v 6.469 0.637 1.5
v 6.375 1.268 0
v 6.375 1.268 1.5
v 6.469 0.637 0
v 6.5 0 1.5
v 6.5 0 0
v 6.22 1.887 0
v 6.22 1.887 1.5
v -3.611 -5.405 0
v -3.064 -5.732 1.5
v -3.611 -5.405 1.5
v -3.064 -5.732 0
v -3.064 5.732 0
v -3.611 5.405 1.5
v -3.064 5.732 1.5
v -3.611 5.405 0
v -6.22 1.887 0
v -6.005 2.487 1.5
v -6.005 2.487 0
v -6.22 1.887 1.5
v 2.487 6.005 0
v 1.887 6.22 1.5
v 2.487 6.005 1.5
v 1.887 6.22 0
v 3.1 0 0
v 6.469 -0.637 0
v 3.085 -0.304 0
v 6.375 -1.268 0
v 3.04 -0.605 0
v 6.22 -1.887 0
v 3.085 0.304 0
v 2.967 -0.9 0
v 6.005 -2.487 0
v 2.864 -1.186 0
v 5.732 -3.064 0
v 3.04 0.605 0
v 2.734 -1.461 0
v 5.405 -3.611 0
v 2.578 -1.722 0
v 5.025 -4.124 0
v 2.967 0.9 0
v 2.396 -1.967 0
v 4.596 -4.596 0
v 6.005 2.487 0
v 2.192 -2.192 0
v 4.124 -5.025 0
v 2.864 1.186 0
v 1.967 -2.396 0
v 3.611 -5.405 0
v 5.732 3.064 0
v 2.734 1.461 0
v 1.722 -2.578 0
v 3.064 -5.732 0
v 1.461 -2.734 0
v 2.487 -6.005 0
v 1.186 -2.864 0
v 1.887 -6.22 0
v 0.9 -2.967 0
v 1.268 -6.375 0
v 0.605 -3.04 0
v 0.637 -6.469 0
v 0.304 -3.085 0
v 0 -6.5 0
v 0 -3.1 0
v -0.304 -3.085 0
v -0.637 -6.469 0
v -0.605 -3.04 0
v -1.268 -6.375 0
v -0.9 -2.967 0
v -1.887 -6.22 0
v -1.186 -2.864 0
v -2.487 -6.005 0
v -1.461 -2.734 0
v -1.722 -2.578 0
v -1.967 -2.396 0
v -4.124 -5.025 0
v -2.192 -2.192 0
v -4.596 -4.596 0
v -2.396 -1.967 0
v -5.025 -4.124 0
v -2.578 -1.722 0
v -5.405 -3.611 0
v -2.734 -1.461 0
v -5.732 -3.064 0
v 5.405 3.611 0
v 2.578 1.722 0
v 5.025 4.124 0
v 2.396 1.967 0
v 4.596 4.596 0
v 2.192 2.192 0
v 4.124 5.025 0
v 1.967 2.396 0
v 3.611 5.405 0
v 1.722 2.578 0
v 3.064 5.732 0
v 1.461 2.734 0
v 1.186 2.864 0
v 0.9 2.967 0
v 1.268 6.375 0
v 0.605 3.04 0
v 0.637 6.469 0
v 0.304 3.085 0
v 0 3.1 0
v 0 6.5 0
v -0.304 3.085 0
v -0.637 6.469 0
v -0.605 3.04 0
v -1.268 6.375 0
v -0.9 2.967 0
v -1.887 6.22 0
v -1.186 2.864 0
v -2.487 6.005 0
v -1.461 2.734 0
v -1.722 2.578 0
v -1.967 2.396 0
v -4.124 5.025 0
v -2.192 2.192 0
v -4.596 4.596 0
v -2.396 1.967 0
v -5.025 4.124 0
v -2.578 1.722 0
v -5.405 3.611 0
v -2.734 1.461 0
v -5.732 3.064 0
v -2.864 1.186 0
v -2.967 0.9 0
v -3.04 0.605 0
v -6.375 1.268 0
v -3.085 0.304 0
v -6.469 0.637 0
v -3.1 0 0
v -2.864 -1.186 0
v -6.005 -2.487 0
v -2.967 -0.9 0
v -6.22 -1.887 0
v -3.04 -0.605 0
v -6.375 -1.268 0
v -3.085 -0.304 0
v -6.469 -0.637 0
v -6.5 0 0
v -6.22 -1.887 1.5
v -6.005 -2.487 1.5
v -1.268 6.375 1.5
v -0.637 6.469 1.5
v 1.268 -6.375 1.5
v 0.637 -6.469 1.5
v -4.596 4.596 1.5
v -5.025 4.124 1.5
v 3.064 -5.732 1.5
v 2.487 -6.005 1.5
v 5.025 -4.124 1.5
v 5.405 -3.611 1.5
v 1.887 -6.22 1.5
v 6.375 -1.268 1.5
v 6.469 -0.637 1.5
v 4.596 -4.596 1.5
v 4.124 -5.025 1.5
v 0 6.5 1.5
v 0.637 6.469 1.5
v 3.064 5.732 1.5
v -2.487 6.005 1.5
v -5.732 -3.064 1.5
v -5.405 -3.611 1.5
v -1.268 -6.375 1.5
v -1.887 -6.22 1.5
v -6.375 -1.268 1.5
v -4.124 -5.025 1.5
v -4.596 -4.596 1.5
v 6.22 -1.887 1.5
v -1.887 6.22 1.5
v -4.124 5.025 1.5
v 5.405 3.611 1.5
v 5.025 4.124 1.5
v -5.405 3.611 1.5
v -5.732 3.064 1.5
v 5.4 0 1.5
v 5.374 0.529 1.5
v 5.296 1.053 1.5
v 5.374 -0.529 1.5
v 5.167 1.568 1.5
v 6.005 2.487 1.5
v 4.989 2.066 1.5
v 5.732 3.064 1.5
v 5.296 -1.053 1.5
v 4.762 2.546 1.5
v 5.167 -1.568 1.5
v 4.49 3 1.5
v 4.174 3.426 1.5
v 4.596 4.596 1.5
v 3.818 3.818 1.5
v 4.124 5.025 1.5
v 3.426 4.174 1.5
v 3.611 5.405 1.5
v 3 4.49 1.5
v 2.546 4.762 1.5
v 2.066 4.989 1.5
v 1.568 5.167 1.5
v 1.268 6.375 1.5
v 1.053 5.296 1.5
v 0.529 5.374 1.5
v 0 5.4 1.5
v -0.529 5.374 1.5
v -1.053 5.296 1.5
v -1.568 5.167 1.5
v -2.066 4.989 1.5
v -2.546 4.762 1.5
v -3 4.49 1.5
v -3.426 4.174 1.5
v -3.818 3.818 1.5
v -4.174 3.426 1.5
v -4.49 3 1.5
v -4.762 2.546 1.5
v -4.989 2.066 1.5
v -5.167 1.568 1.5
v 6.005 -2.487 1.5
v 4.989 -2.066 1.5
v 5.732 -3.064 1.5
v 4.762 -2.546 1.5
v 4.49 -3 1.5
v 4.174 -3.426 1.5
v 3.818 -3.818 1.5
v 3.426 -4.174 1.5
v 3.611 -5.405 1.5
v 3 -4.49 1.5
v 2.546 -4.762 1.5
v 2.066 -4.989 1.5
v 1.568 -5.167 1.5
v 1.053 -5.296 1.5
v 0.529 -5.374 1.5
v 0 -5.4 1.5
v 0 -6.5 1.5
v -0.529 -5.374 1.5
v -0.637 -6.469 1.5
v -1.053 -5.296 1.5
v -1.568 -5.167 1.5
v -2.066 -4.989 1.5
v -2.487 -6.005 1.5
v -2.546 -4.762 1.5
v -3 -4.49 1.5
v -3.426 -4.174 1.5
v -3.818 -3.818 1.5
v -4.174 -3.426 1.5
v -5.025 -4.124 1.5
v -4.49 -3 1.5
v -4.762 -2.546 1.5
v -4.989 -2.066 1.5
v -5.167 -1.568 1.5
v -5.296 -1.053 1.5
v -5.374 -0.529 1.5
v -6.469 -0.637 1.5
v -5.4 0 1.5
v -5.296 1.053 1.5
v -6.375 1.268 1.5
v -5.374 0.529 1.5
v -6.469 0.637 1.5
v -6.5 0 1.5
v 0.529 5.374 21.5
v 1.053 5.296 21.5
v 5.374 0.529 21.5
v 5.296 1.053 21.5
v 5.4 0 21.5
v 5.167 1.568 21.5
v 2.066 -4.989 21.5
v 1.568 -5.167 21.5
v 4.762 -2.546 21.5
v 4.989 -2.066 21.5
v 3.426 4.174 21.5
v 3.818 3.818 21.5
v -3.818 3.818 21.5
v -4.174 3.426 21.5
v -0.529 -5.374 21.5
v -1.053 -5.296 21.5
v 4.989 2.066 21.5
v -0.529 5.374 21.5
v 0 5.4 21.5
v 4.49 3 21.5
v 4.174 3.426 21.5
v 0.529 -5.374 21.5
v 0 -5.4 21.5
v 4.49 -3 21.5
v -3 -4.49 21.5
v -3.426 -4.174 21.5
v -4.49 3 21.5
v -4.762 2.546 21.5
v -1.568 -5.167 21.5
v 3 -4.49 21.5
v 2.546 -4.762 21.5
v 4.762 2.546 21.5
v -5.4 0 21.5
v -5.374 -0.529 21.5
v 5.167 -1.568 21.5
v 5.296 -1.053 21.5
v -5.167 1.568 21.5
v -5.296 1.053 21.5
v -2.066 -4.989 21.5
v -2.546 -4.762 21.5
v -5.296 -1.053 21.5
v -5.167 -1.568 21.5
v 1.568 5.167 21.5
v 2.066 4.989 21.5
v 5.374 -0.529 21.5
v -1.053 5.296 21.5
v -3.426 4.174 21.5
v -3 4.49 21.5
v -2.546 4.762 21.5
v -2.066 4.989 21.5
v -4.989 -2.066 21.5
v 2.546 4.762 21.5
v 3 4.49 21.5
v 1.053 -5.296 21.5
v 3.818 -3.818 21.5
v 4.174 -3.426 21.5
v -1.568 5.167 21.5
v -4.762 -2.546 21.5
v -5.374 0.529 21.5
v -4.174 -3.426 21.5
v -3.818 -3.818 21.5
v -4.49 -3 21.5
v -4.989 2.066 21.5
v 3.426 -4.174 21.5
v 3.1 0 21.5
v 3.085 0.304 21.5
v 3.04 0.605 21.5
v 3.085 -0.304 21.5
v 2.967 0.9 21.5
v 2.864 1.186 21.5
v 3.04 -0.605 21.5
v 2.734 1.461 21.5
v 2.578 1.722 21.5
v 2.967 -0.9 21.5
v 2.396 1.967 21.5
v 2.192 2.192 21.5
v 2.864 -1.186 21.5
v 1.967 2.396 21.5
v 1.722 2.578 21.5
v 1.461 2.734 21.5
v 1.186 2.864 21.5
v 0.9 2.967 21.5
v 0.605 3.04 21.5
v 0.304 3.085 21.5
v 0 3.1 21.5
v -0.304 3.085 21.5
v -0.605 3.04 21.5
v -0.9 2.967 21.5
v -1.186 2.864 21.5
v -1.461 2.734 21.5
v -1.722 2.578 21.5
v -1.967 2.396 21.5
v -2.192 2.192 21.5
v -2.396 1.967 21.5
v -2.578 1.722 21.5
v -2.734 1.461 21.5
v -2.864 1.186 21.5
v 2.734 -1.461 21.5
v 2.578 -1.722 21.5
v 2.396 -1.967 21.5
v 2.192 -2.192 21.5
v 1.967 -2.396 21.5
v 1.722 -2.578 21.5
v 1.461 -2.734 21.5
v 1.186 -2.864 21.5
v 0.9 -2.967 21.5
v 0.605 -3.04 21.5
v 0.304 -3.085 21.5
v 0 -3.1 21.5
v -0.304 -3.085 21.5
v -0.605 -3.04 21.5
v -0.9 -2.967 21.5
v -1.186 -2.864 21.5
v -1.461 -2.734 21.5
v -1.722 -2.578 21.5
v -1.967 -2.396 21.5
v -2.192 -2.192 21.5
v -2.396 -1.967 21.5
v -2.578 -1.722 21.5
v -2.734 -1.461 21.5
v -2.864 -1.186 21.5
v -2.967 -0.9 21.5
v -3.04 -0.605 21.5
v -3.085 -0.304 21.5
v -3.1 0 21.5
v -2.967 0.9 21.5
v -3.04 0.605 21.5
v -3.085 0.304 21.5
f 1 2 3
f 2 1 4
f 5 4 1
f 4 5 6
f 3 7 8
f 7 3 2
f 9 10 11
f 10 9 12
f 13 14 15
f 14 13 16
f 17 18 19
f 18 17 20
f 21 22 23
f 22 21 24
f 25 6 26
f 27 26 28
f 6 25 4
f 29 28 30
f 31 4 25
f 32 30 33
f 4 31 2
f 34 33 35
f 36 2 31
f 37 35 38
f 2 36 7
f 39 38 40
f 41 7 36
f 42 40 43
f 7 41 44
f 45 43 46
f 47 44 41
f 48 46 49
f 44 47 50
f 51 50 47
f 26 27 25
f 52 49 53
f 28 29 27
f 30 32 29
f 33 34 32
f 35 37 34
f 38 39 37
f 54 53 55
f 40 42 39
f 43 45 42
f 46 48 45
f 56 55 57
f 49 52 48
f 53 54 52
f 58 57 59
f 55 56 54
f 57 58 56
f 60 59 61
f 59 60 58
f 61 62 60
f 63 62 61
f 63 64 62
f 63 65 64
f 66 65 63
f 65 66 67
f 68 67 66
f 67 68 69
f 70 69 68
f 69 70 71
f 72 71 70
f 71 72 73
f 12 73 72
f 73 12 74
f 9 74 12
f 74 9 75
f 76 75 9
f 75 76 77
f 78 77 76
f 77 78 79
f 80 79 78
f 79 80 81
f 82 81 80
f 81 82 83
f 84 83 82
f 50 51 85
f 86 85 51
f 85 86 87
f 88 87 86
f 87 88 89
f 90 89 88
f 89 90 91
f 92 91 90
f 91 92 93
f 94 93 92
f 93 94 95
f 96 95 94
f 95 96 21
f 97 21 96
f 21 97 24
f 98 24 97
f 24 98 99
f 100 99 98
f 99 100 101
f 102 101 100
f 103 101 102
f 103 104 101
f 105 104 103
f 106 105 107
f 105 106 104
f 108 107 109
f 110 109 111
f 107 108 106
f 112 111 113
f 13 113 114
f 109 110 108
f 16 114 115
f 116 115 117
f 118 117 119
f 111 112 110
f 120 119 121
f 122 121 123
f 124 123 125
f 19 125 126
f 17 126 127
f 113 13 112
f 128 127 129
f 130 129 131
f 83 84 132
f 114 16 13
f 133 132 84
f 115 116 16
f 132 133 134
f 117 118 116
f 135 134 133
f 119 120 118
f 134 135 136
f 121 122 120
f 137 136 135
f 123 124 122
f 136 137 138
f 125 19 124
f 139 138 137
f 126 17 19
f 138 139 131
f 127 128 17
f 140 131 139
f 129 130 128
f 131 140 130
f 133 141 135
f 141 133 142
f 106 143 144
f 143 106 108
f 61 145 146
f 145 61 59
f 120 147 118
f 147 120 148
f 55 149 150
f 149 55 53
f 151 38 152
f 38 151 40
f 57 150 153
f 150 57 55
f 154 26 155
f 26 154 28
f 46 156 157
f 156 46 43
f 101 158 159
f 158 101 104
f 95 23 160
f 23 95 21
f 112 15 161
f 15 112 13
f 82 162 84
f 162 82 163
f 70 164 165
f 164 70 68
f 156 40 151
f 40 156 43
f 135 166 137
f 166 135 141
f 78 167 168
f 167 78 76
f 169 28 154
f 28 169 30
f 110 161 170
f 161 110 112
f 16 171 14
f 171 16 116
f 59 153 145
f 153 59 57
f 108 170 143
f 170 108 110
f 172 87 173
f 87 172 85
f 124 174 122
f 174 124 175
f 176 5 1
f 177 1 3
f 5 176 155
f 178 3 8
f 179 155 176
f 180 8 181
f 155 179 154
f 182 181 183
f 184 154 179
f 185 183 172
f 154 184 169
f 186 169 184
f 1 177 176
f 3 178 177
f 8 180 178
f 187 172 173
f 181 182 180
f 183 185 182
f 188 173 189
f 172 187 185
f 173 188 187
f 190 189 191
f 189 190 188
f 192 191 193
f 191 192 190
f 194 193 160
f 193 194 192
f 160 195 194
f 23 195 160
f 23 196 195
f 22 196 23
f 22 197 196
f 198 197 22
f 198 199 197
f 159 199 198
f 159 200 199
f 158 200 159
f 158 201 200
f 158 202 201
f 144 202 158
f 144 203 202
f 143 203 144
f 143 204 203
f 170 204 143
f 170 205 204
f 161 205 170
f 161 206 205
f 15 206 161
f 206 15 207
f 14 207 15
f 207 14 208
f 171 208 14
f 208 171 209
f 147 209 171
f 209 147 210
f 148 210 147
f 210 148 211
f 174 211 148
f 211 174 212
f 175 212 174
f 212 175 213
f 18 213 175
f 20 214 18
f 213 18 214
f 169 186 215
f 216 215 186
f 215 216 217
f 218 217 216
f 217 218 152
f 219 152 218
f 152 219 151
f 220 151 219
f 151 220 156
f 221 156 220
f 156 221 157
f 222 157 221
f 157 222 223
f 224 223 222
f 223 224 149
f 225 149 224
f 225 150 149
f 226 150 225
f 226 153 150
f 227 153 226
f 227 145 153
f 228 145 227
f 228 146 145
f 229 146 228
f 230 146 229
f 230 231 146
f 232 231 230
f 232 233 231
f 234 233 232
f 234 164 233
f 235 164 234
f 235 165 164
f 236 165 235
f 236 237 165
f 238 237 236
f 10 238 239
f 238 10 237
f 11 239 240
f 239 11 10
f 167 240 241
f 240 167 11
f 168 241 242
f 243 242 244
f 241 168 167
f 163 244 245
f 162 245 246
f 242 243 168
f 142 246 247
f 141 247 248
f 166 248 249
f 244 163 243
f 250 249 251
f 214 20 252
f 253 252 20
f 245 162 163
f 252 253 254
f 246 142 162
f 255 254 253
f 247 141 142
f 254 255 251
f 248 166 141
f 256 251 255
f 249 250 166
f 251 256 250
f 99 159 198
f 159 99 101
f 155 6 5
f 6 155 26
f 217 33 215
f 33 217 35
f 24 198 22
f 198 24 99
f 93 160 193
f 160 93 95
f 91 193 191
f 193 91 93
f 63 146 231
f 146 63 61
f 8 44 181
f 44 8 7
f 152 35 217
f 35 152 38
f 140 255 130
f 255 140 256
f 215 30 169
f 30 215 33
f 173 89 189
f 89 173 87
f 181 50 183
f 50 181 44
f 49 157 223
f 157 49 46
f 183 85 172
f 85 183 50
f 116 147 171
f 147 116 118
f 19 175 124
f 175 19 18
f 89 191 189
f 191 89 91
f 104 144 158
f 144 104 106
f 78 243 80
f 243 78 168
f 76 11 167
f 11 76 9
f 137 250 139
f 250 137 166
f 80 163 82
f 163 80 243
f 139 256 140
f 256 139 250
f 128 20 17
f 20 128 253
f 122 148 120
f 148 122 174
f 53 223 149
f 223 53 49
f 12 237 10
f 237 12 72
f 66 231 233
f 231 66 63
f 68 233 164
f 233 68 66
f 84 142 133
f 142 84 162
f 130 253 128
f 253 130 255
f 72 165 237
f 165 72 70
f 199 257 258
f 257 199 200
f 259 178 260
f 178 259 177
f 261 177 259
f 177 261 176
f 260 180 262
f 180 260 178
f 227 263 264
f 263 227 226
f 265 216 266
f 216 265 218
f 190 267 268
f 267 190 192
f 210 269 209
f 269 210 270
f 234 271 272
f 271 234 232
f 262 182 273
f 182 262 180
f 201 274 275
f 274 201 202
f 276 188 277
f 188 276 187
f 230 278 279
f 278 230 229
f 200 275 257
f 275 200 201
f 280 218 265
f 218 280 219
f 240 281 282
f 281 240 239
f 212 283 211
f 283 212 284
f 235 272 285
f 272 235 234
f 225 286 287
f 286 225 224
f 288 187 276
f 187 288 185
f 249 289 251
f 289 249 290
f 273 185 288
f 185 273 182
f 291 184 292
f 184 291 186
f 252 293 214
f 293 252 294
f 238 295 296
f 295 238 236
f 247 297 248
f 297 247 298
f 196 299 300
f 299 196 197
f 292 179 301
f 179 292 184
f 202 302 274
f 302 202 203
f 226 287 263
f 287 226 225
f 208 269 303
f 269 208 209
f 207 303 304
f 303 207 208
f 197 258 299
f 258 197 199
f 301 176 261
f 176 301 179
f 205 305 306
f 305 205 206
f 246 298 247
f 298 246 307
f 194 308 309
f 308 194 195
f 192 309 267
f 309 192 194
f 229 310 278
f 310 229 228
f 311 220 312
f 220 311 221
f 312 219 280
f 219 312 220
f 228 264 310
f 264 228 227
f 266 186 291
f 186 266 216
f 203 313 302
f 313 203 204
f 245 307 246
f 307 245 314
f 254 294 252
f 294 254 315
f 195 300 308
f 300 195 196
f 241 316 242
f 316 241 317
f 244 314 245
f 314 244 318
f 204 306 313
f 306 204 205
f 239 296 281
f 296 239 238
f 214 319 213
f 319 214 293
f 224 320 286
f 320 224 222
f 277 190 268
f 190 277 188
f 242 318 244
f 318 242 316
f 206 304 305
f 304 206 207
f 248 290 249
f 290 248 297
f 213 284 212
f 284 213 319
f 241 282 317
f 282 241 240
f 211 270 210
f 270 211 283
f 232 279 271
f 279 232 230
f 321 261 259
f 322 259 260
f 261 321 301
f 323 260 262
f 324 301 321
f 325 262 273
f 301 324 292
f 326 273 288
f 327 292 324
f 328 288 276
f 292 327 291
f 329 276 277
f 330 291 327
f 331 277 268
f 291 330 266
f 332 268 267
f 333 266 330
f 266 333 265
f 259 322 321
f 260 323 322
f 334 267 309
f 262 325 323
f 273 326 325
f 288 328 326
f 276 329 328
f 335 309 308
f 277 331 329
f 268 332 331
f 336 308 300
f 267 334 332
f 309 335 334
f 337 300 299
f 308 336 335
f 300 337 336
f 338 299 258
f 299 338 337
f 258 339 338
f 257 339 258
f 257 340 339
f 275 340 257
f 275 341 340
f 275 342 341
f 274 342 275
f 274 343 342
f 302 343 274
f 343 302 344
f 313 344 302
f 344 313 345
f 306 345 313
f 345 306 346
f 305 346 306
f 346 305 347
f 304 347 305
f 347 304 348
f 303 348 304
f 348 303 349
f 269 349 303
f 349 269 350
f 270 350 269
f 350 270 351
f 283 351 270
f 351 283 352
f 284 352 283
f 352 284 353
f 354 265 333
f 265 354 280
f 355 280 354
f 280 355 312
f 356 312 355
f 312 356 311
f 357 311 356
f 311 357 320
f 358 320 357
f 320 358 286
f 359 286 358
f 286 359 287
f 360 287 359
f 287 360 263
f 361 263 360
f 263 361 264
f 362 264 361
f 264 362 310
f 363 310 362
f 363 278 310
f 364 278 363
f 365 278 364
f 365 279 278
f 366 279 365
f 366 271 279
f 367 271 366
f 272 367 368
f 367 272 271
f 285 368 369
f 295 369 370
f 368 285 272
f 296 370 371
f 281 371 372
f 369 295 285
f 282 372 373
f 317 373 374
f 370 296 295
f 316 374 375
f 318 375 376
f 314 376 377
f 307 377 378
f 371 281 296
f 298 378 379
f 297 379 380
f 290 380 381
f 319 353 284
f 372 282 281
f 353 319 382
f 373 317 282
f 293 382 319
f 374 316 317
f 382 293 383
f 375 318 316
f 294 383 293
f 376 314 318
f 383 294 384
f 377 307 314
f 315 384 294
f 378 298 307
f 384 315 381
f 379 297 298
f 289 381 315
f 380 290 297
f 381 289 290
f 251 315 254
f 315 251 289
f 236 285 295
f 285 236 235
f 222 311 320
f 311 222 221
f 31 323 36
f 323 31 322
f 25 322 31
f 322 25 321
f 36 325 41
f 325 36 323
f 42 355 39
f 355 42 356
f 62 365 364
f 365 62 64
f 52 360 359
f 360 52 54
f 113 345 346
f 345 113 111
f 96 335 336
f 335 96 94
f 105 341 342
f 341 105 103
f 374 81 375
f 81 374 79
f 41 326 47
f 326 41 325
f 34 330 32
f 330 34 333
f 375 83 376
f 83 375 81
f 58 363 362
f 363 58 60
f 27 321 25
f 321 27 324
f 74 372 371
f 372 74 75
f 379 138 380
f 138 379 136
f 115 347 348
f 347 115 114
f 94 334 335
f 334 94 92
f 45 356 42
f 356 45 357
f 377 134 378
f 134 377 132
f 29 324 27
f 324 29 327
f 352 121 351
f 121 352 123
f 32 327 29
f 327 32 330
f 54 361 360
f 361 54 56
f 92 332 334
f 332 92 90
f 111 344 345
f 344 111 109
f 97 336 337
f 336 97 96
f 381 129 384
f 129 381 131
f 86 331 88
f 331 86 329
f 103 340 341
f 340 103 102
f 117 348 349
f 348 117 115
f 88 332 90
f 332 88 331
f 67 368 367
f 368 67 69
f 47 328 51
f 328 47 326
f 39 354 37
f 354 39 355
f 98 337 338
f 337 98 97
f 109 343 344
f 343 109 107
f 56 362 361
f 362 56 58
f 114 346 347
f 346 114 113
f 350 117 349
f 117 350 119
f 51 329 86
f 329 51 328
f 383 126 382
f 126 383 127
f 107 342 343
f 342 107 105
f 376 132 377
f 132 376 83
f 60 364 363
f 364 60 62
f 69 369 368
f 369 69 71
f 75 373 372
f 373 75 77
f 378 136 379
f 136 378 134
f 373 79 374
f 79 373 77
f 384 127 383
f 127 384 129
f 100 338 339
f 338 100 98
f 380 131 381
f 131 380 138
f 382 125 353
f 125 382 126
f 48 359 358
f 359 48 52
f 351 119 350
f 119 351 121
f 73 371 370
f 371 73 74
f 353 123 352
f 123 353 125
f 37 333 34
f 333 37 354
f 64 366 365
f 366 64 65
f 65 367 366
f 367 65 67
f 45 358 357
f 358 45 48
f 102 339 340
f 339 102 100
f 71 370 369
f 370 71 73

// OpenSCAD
// Adapter sleeve: 0.2 mL PCR tube for 1.5 mL tube rack
// Print orientation: collar down on the bed (z = 0), sleeve up (+Z)

$fn = 64;

// ---- Dimensions (mm) ----
collar_d      = 13;    // collar diameter
collar_h      = 1.5;   // collar thickness (z = 0 to 1.5)
sleeve_od     = 10.8;  // sleeve outer diameter
sleeve_top_z  = 21.5;  // top of sleeve (sleeve spans z = 1.5 to 21.5)
bore_d        = 6.2;   // through-bore diameter
eps           = 0.5;   // cutter overshoot past faces

total_h = sleeve_top_z; // full height for through-bore (0 to 21.5)

// ---- Model ----
difference() {
    union() {
        // Collar
        cylinder(d = collar_d, h = collar_h);
        // Sleeve body (slightly overlaps collar for a clean union)
        translate([0, 0, collar_h - 0.01])
            cylinder(d = sleeve_od, h = sleeve_top_z - collar_h + 0.01);
    }
    // Straight through-bore
    translate([0, 0, -eps])
        cylinder(d = bore_d, h = total_h + 2 * eps);
}
